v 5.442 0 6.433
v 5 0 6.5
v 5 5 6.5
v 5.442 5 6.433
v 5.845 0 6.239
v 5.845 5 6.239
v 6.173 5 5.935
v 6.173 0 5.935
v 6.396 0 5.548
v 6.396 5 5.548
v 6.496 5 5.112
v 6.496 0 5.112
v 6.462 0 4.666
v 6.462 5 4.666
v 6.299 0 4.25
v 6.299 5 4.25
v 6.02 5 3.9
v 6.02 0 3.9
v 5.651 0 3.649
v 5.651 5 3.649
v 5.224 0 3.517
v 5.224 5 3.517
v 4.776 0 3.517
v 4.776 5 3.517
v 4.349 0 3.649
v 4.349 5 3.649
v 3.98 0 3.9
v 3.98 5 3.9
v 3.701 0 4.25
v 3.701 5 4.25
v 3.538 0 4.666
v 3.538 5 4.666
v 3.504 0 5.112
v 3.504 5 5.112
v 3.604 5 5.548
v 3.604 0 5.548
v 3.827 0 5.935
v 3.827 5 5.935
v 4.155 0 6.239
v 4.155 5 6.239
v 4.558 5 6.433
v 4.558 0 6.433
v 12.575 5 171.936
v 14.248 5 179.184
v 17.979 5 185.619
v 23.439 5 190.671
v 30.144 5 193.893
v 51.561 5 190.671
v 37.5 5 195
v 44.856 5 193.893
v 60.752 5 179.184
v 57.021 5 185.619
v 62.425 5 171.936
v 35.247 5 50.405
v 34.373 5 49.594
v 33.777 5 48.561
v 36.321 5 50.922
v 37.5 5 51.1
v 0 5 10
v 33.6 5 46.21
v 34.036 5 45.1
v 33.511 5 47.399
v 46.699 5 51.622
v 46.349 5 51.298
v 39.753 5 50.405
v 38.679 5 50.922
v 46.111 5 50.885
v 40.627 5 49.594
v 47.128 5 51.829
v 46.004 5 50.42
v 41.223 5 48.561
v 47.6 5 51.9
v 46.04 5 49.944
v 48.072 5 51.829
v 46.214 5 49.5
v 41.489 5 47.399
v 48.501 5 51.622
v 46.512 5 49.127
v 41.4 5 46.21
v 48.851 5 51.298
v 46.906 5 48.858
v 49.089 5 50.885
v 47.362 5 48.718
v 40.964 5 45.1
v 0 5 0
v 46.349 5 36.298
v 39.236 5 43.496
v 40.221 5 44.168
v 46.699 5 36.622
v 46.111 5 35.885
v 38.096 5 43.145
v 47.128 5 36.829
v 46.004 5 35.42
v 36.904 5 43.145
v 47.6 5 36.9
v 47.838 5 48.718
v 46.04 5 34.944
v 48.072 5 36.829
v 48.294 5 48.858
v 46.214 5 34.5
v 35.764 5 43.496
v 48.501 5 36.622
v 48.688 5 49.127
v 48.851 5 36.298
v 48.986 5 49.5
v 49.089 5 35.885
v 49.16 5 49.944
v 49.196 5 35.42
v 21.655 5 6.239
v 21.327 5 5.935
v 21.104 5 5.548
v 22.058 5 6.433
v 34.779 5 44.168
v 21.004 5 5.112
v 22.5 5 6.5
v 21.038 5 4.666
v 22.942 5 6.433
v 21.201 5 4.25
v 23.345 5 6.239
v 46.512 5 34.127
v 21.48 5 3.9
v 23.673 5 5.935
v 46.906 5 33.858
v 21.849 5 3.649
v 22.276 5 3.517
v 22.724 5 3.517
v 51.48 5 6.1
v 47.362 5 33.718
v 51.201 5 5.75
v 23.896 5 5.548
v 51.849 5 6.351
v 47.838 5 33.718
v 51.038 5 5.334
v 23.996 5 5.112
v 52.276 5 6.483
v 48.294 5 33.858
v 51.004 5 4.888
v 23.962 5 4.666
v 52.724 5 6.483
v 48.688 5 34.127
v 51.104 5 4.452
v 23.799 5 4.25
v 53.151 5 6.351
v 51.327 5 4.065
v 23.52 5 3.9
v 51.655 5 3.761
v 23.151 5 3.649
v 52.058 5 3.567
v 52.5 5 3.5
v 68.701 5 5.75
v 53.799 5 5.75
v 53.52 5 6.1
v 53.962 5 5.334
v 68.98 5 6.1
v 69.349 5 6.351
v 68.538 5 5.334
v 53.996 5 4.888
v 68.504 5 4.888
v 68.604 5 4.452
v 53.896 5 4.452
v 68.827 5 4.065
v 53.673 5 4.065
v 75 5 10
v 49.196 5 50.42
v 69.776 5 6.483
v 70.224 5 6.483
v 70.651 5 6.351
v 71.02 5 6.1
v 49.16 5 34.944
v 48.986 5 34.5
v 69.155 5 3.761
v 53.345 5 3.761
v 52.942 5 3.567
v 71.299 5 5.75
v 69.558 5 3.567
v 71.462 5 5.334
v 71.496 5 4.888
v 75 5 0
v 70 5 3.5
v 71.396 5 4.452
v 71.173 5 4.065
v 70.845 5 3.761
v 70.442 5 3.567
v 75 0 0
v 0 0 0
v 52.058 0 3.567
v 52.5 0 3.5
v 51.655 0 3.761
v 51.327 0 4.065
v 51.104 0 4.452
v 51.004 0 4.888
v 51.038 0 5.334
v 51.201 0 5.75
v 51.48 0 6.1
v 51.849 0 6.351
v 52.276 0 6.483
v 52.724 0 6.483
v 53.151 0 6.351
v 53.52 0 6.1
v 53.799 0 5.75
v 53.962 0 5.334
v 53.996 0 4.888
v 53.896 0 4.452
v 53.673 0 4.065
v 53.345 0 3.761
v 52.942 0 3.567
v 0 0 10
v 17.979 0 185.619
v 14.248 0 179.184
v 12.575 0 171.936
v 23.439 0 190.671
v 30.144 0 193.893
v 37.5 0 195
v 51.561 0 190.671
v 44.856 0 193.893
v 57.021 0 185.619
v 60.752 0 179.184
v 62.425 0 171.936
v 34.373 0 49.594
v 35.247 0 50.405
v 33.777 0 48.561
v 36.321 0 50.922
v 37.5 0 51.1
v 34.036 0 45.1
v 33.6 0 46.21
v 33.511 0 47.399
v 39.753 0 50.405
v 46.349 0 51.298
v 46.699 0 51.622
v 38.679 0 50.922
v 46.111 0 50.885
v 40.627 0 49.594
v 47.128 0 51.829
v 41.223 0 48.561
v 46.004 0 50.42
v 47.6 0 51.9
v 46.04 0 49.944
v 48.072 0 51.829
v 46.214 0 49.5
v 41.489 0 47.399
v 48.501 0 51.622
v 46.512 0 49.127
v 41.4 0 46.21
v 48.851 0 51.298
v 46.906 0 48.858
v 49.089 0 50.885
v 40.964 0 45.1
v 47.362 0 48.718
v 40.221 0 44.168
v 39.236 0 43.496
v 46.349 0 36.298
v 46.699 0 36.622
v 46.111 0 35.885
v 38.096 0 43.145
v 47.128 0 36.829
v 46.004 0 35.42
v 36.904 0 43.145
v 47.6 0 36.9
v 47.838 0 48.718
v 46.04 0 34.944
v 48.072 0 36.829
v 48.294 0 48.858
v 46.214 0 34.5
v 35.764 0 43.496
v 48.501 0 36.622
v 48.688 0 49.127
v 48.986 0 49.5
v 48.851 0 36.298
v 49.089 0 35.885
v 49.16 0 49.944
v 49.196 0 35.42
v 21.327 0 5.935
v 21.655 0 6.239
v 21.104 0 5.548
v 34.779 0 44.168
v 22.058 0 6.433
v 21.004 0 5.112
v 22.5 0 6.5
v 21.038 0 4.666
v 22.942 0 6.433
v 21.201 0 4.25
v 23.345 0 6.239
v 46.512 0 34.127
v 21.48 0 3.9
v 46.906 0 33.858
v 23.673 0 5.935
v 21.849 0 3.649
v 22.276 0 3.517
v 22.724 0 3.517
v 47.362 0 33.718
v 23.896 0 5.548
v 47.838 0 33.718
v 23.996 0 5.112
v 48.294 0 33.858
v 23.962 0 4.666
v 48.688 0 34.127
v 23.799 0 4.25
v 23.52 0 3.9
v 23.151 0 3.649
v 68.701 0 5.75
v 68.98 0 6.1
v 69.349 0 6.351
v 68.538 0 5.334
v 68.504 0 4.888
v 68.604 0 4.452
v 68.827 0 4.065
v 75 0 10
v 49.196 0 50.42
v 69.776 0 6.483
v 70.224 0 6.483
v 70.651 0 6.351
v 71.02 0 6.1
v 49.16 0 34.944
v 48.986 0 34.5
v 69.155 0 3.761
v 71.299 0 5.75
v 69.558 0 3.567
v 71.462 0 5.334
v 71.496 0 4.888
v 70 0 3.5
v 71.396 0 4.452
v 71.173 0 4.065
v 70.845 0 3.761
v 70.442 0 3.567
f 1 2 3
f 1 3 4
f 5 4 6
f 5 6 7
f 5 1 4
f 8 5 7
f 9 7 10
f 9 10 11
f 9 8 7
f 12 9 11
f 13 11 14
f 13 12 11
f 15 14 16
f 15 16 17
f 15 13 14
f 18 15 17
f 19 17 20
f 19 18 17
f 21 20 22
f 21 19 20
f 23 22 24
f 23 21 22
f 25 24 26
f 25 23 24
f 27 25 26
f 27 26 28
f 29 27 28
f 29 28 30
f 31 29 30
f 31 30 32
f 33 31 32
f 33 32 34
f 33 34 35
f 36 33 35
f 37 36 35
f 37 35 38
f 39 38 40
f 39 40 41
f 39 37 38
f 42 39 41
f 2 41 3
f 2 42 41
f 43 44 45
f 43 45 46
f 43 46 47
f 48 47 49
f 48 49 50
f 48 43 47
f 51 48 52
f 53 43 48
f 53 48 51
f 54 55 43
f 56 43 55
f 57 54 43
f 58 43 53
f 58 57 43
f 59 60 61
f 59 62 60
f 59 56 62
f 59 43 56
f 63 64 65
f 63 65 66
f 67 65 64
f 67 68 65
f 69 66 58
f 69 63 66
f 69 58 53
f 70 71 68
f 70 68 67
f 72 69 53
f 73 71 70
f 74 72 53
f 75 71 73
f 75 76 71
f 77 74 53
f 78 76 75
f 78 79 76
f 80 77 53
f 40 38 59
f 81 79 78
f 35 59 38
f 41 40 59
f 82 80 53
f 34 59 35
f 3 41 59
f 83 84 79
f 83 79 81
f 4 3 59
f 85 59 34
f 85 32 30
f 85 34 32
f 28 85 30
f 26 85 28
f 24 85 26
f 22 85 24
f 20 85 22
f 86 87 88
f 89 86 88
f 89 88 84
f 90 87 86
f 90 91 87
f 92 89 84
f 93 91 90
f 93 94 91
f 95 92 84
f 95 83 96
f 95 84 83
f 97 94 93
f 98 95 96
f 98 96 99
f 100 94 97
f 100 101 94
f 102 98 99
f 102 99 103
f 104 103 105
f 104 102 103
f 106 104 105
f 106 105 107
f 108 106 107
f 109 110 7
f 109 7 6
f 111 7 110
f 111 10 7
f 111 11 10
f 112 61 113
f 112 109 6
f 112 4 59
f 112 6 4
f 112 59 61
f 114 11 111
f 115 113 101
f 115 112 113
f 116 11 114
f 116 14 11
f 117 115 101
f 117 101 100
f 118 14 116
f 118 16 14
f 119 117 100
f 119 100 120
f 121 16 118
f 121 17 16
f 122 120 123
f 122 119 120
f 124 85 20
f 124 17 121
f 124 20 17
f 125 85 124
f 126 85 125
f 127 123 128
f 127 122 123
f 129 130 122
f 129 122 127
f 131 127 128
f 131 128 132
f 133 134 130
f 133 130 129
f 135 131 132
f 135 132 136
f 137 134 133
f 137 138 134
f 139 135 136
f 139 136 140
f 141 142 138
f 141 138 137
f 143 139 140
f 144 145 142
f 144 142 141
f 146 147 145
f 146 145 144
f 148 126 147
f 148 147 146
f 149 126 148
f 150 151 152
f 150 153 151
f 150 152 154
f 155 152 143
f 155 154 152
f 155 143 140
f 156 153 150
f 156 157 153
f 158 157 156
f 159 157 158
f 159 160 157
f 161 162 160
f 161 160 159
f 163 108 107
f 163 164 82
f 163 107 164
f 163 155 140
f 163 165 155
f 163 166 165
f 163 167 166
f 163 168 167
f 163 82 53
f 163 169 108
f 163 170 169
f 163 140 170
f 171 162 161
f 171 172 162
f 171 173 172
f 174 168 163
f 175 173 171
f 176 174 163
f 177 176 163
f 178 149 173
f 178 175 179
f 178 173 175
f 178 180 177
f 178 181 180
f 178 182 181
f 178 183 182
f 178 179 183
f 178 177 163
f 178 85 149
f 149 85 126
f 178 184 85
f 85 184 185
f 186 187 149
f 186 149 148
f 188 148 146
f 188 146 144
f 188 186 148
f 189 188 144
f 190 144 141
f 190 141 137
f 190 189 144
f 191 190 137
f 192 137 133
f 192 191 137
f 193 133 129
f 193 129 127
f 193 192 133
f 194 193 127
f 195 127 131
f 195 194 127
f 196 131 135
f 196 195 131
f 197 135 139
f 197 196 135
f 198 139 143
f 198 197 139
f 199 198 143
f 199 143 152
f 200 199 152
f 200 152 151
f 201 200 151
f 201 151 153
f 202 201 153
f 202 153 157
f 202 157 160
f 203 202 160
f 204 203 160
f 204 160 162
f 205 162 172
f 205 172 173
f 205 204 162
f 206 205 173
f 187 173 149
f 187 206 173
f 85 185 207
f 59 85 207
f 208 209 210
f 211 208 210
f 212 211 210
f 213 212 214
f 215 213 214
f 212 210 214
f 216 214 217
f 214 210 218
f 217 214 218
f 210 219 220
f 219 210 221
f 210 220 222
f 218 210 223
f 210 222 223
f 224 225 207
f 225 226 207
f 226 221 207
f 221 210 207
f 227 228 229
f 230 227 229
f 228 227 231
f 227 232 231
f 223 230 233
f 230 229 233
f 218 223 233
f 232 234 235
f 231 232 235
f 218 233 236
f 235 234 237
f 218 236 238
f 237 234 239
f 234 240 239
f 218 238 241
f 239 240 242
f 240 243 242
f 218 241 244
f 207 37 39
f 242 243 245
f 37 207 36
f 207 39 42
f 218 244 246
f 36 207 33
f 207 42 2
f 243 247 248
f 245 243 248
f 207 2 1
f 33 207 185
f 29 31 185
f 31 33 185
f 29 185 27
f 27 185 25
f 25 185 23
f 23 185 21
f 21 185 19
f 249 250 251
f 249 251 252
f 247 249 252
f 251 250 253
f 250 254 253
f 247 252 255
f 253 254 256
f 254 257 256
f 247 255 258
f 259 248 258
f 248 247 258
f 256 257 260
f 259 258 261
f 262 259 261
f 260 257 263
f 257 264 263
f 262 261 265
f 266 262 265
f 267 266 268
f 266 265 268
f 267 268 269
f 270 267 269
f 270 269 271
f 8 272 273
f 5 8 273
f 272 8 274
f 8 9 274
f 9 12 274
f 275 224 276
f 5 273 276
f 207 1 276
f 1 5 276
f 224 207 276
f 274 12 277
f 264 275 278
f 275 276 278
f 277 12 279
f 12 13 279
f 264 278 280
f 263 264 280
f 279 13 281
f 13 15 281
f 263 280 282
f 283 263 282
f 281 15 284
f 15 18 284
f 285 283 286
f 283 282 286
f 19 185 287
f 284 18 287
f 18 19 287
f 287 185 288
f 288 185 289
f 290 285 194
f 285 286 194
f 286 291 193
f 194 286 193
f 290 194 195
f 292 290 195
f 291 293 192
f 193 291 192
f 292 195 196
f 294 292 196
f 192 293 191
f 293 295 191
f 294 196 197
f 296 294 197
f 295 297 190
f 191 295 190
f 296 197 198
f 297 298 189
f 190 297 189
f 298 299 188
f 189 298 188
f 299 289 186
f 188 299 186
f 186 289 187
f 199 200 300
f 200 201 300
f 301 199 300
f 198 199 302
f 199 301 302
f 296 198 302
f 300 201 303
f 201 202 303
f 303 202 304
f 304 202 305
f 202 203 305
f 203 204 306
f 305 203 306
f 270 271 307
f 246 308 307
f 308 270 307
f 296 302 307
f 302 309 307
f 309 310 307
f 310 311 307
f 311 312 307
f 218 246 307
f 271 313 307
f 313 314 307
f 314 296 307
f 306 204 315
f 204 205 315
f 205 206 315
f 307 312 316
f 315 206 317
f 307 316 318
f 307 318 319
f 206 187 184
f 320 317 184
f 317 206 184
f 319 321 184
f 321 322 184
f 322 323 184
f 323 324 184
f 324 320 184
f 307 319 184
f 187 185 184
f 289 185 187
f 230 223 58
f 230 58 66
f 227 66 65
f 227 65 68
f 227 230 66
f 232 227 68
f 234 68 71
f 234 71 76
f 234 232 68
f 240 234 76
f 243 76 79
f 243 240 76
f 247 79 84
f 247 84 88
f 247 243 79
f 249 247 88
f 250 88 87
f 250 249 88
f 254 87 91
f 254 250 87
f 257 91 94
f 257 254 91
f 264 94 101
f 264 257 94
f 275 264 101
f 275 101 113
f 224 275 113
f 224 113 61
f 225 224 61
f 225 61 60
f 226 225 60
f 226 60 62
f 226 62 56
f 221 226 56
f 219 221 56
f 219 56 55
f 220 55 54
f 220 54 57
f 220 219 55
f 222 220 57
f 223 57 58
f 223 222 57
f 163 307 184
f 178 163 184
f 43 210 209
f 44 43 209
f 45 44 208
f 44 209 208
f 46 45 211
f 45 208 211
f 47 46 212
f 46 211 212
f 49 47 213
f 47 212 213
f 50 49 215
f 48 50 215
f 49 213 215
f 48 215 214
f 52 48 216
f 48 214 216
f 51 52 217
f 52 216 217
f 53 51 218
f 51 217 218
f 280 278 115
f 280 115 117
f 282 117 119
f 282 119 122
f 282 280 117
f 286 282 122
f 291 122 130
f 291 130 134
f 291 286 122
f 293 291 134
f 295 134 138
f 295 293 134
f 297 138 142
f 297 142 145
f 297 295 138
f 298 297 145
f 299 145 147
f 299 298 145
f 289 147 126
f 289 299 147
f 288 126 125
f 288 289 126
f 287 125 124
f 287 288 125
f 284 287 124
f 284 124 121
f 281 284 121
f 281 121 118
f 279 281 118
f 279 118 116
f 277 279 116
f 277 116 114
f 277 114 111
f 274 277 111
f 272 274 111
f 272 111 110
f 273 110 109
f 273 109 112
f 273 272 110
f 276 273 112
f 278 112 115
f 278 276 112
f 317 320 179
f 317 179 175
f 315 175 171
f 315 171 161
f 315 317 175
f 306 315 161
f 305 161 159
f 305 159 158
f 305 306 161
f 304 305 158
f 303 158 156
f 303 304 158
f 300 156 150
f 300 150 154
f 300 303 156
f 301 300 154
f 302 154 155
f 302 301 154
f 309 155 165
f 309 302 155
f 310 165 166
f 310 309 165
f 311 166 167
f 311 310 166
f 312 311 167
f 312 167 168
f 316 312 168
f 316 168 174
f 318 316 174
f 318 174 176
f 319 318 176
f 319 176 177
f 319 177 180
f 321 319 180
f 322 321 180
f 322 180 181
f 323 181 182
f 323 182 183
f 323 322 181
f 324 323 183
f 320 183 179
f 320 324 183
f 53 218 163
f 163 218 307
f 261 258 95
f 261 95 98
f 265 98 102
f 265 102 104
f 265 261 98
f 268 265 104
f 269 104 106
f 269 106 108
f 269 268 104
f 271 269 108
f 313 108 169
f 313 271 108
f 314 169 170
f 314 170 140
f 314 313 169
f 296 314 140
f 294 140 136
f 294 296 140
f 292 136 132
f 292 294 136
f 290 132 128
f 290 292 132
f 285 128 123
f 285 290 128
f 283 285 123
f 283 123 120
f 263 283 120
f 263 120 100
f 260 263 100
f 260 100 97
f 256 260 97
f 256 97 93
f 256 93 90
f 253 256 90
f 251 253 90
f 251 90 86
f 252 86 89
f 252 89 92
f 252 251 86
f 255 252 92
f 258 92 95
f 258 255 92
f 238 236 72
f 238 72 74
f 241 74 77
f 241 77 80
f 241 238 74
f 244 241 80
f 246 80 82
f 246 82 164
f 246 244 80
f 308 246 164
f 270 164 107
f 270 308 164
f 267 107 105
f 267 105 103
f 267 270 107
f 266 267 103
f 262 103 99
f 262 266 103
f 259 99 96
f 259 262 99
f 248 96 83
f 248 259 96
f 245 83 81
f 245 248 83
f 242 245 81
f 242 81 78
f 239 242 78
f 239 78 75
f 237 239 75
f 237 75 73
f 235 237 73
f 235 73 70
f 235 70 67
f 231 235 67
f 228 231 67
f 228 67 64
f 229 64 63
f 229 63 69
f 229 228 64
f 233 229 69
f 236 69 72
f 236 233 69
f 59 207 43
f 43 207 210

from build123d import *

# Parameters (mm, degrees)
SKETCH_1_R      = 1.5
SKETCH_1_R_2    = 4
SKETCH_1_R_3    = 1.6
EXTRUDE_1_DEPTH = 5


with BuildPart() as part:
    # ｽｹｯﾁ1 → ﾎﾞｽ - 押し出し1 (new body)
    with BuildSketch(Plane(origin=(0, 0, 0), x_dir=(1, 0, 0), z_dir=(0, 1, 0))):
        with BuildLine():
            Line((0, 0), (0, -10))
            Line((0, -10), (12.575038747, -171.935537794))
            ThreePointArc((12.575038747, -171.935537794), (37.5, -195), (62.424961253, -171.935537794))
            Line((62.424961253, -171.935537794), (75, -10))
            Line((75, -10), (75, 0))
            Line((75, 0), (0, 0))
        make_face()
        with Locations(Location((5, -5, 0), (0, 0, 270))):
            Circle(SKETCH_1_R, mode=Mode.SUBTRACT)
        with Locations(Location((70, -5, 0), (0, 0, 90))):
            Circle(SKETCH_1_R, mode=Mode.SUBTRACT)
        with Locations(Location((22.5, -5, 0), (0, 0, 270))):
            Circle(SKETCH_1_R, mode=Mode.SUBTRACT)
        with Locations(Location((52.5, -5, 0), (0, 0, 90))):
            Circle(SKETCH_1_R, mode=Mode.SUBTRACT)
        with Locations(Location((37.5, -47.1, 0), (0, 0, 270))):
            Circle(SKETCH_1_R_2, mode=Mode.SUBTRACT)
        with Locations(Location((47.6, -35.3, 0), (0, 0, 270))):
            Circle(SKETCH_1_R_3, mode=Mode.SUBTRACT)
        with Locations(Location((47.6, -50.3, 0), (0, 0, 270))):
            Circle(SKETCH_1_R_3, mode=Mode.SUBTRACT)
    extrude(amount=EXTRUDE_1_DEPTH)


solid = part.part
